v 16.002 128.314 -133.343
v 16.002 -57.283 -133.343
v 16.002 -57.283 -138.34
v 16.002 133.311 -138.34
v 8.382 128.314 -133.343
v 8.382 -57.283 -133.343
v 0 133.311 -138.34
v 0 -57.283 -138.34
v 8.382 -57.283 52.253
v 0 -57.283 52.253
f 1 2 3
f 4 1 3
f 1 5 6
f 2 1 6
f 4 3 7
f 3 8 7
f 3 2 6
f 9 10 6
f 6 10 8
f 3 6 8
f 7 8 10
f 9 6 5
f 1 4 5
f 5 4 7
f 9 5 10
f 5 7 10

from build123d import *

# Parameters (mm, degrees)
F1_DEPTH = 8.382
F3_DEPTH = 7.62


with BuildPart() as f1:
    # F0 (on Right) → F1 (new body)
    with BuildSketch(Plane.YZ):
        Polygon((133.310616, -138.339952), (-57.282638, 52.253302), (-57.282638, -138.339952), align=None)
    extrude(amount=F1_DEPTH)

    # F2 (on face) → F3 (join)
    with BuildSketch(Plane.YZ.offset(8.382)):
        Polygon((-57.282638, -133.343466), (-57.282638, -138.339952), (133.310616, -138.339952), (128.31413, -133.343466), align=None)
    extrude(amount=F3_DEPTH)


solid = f1.part
